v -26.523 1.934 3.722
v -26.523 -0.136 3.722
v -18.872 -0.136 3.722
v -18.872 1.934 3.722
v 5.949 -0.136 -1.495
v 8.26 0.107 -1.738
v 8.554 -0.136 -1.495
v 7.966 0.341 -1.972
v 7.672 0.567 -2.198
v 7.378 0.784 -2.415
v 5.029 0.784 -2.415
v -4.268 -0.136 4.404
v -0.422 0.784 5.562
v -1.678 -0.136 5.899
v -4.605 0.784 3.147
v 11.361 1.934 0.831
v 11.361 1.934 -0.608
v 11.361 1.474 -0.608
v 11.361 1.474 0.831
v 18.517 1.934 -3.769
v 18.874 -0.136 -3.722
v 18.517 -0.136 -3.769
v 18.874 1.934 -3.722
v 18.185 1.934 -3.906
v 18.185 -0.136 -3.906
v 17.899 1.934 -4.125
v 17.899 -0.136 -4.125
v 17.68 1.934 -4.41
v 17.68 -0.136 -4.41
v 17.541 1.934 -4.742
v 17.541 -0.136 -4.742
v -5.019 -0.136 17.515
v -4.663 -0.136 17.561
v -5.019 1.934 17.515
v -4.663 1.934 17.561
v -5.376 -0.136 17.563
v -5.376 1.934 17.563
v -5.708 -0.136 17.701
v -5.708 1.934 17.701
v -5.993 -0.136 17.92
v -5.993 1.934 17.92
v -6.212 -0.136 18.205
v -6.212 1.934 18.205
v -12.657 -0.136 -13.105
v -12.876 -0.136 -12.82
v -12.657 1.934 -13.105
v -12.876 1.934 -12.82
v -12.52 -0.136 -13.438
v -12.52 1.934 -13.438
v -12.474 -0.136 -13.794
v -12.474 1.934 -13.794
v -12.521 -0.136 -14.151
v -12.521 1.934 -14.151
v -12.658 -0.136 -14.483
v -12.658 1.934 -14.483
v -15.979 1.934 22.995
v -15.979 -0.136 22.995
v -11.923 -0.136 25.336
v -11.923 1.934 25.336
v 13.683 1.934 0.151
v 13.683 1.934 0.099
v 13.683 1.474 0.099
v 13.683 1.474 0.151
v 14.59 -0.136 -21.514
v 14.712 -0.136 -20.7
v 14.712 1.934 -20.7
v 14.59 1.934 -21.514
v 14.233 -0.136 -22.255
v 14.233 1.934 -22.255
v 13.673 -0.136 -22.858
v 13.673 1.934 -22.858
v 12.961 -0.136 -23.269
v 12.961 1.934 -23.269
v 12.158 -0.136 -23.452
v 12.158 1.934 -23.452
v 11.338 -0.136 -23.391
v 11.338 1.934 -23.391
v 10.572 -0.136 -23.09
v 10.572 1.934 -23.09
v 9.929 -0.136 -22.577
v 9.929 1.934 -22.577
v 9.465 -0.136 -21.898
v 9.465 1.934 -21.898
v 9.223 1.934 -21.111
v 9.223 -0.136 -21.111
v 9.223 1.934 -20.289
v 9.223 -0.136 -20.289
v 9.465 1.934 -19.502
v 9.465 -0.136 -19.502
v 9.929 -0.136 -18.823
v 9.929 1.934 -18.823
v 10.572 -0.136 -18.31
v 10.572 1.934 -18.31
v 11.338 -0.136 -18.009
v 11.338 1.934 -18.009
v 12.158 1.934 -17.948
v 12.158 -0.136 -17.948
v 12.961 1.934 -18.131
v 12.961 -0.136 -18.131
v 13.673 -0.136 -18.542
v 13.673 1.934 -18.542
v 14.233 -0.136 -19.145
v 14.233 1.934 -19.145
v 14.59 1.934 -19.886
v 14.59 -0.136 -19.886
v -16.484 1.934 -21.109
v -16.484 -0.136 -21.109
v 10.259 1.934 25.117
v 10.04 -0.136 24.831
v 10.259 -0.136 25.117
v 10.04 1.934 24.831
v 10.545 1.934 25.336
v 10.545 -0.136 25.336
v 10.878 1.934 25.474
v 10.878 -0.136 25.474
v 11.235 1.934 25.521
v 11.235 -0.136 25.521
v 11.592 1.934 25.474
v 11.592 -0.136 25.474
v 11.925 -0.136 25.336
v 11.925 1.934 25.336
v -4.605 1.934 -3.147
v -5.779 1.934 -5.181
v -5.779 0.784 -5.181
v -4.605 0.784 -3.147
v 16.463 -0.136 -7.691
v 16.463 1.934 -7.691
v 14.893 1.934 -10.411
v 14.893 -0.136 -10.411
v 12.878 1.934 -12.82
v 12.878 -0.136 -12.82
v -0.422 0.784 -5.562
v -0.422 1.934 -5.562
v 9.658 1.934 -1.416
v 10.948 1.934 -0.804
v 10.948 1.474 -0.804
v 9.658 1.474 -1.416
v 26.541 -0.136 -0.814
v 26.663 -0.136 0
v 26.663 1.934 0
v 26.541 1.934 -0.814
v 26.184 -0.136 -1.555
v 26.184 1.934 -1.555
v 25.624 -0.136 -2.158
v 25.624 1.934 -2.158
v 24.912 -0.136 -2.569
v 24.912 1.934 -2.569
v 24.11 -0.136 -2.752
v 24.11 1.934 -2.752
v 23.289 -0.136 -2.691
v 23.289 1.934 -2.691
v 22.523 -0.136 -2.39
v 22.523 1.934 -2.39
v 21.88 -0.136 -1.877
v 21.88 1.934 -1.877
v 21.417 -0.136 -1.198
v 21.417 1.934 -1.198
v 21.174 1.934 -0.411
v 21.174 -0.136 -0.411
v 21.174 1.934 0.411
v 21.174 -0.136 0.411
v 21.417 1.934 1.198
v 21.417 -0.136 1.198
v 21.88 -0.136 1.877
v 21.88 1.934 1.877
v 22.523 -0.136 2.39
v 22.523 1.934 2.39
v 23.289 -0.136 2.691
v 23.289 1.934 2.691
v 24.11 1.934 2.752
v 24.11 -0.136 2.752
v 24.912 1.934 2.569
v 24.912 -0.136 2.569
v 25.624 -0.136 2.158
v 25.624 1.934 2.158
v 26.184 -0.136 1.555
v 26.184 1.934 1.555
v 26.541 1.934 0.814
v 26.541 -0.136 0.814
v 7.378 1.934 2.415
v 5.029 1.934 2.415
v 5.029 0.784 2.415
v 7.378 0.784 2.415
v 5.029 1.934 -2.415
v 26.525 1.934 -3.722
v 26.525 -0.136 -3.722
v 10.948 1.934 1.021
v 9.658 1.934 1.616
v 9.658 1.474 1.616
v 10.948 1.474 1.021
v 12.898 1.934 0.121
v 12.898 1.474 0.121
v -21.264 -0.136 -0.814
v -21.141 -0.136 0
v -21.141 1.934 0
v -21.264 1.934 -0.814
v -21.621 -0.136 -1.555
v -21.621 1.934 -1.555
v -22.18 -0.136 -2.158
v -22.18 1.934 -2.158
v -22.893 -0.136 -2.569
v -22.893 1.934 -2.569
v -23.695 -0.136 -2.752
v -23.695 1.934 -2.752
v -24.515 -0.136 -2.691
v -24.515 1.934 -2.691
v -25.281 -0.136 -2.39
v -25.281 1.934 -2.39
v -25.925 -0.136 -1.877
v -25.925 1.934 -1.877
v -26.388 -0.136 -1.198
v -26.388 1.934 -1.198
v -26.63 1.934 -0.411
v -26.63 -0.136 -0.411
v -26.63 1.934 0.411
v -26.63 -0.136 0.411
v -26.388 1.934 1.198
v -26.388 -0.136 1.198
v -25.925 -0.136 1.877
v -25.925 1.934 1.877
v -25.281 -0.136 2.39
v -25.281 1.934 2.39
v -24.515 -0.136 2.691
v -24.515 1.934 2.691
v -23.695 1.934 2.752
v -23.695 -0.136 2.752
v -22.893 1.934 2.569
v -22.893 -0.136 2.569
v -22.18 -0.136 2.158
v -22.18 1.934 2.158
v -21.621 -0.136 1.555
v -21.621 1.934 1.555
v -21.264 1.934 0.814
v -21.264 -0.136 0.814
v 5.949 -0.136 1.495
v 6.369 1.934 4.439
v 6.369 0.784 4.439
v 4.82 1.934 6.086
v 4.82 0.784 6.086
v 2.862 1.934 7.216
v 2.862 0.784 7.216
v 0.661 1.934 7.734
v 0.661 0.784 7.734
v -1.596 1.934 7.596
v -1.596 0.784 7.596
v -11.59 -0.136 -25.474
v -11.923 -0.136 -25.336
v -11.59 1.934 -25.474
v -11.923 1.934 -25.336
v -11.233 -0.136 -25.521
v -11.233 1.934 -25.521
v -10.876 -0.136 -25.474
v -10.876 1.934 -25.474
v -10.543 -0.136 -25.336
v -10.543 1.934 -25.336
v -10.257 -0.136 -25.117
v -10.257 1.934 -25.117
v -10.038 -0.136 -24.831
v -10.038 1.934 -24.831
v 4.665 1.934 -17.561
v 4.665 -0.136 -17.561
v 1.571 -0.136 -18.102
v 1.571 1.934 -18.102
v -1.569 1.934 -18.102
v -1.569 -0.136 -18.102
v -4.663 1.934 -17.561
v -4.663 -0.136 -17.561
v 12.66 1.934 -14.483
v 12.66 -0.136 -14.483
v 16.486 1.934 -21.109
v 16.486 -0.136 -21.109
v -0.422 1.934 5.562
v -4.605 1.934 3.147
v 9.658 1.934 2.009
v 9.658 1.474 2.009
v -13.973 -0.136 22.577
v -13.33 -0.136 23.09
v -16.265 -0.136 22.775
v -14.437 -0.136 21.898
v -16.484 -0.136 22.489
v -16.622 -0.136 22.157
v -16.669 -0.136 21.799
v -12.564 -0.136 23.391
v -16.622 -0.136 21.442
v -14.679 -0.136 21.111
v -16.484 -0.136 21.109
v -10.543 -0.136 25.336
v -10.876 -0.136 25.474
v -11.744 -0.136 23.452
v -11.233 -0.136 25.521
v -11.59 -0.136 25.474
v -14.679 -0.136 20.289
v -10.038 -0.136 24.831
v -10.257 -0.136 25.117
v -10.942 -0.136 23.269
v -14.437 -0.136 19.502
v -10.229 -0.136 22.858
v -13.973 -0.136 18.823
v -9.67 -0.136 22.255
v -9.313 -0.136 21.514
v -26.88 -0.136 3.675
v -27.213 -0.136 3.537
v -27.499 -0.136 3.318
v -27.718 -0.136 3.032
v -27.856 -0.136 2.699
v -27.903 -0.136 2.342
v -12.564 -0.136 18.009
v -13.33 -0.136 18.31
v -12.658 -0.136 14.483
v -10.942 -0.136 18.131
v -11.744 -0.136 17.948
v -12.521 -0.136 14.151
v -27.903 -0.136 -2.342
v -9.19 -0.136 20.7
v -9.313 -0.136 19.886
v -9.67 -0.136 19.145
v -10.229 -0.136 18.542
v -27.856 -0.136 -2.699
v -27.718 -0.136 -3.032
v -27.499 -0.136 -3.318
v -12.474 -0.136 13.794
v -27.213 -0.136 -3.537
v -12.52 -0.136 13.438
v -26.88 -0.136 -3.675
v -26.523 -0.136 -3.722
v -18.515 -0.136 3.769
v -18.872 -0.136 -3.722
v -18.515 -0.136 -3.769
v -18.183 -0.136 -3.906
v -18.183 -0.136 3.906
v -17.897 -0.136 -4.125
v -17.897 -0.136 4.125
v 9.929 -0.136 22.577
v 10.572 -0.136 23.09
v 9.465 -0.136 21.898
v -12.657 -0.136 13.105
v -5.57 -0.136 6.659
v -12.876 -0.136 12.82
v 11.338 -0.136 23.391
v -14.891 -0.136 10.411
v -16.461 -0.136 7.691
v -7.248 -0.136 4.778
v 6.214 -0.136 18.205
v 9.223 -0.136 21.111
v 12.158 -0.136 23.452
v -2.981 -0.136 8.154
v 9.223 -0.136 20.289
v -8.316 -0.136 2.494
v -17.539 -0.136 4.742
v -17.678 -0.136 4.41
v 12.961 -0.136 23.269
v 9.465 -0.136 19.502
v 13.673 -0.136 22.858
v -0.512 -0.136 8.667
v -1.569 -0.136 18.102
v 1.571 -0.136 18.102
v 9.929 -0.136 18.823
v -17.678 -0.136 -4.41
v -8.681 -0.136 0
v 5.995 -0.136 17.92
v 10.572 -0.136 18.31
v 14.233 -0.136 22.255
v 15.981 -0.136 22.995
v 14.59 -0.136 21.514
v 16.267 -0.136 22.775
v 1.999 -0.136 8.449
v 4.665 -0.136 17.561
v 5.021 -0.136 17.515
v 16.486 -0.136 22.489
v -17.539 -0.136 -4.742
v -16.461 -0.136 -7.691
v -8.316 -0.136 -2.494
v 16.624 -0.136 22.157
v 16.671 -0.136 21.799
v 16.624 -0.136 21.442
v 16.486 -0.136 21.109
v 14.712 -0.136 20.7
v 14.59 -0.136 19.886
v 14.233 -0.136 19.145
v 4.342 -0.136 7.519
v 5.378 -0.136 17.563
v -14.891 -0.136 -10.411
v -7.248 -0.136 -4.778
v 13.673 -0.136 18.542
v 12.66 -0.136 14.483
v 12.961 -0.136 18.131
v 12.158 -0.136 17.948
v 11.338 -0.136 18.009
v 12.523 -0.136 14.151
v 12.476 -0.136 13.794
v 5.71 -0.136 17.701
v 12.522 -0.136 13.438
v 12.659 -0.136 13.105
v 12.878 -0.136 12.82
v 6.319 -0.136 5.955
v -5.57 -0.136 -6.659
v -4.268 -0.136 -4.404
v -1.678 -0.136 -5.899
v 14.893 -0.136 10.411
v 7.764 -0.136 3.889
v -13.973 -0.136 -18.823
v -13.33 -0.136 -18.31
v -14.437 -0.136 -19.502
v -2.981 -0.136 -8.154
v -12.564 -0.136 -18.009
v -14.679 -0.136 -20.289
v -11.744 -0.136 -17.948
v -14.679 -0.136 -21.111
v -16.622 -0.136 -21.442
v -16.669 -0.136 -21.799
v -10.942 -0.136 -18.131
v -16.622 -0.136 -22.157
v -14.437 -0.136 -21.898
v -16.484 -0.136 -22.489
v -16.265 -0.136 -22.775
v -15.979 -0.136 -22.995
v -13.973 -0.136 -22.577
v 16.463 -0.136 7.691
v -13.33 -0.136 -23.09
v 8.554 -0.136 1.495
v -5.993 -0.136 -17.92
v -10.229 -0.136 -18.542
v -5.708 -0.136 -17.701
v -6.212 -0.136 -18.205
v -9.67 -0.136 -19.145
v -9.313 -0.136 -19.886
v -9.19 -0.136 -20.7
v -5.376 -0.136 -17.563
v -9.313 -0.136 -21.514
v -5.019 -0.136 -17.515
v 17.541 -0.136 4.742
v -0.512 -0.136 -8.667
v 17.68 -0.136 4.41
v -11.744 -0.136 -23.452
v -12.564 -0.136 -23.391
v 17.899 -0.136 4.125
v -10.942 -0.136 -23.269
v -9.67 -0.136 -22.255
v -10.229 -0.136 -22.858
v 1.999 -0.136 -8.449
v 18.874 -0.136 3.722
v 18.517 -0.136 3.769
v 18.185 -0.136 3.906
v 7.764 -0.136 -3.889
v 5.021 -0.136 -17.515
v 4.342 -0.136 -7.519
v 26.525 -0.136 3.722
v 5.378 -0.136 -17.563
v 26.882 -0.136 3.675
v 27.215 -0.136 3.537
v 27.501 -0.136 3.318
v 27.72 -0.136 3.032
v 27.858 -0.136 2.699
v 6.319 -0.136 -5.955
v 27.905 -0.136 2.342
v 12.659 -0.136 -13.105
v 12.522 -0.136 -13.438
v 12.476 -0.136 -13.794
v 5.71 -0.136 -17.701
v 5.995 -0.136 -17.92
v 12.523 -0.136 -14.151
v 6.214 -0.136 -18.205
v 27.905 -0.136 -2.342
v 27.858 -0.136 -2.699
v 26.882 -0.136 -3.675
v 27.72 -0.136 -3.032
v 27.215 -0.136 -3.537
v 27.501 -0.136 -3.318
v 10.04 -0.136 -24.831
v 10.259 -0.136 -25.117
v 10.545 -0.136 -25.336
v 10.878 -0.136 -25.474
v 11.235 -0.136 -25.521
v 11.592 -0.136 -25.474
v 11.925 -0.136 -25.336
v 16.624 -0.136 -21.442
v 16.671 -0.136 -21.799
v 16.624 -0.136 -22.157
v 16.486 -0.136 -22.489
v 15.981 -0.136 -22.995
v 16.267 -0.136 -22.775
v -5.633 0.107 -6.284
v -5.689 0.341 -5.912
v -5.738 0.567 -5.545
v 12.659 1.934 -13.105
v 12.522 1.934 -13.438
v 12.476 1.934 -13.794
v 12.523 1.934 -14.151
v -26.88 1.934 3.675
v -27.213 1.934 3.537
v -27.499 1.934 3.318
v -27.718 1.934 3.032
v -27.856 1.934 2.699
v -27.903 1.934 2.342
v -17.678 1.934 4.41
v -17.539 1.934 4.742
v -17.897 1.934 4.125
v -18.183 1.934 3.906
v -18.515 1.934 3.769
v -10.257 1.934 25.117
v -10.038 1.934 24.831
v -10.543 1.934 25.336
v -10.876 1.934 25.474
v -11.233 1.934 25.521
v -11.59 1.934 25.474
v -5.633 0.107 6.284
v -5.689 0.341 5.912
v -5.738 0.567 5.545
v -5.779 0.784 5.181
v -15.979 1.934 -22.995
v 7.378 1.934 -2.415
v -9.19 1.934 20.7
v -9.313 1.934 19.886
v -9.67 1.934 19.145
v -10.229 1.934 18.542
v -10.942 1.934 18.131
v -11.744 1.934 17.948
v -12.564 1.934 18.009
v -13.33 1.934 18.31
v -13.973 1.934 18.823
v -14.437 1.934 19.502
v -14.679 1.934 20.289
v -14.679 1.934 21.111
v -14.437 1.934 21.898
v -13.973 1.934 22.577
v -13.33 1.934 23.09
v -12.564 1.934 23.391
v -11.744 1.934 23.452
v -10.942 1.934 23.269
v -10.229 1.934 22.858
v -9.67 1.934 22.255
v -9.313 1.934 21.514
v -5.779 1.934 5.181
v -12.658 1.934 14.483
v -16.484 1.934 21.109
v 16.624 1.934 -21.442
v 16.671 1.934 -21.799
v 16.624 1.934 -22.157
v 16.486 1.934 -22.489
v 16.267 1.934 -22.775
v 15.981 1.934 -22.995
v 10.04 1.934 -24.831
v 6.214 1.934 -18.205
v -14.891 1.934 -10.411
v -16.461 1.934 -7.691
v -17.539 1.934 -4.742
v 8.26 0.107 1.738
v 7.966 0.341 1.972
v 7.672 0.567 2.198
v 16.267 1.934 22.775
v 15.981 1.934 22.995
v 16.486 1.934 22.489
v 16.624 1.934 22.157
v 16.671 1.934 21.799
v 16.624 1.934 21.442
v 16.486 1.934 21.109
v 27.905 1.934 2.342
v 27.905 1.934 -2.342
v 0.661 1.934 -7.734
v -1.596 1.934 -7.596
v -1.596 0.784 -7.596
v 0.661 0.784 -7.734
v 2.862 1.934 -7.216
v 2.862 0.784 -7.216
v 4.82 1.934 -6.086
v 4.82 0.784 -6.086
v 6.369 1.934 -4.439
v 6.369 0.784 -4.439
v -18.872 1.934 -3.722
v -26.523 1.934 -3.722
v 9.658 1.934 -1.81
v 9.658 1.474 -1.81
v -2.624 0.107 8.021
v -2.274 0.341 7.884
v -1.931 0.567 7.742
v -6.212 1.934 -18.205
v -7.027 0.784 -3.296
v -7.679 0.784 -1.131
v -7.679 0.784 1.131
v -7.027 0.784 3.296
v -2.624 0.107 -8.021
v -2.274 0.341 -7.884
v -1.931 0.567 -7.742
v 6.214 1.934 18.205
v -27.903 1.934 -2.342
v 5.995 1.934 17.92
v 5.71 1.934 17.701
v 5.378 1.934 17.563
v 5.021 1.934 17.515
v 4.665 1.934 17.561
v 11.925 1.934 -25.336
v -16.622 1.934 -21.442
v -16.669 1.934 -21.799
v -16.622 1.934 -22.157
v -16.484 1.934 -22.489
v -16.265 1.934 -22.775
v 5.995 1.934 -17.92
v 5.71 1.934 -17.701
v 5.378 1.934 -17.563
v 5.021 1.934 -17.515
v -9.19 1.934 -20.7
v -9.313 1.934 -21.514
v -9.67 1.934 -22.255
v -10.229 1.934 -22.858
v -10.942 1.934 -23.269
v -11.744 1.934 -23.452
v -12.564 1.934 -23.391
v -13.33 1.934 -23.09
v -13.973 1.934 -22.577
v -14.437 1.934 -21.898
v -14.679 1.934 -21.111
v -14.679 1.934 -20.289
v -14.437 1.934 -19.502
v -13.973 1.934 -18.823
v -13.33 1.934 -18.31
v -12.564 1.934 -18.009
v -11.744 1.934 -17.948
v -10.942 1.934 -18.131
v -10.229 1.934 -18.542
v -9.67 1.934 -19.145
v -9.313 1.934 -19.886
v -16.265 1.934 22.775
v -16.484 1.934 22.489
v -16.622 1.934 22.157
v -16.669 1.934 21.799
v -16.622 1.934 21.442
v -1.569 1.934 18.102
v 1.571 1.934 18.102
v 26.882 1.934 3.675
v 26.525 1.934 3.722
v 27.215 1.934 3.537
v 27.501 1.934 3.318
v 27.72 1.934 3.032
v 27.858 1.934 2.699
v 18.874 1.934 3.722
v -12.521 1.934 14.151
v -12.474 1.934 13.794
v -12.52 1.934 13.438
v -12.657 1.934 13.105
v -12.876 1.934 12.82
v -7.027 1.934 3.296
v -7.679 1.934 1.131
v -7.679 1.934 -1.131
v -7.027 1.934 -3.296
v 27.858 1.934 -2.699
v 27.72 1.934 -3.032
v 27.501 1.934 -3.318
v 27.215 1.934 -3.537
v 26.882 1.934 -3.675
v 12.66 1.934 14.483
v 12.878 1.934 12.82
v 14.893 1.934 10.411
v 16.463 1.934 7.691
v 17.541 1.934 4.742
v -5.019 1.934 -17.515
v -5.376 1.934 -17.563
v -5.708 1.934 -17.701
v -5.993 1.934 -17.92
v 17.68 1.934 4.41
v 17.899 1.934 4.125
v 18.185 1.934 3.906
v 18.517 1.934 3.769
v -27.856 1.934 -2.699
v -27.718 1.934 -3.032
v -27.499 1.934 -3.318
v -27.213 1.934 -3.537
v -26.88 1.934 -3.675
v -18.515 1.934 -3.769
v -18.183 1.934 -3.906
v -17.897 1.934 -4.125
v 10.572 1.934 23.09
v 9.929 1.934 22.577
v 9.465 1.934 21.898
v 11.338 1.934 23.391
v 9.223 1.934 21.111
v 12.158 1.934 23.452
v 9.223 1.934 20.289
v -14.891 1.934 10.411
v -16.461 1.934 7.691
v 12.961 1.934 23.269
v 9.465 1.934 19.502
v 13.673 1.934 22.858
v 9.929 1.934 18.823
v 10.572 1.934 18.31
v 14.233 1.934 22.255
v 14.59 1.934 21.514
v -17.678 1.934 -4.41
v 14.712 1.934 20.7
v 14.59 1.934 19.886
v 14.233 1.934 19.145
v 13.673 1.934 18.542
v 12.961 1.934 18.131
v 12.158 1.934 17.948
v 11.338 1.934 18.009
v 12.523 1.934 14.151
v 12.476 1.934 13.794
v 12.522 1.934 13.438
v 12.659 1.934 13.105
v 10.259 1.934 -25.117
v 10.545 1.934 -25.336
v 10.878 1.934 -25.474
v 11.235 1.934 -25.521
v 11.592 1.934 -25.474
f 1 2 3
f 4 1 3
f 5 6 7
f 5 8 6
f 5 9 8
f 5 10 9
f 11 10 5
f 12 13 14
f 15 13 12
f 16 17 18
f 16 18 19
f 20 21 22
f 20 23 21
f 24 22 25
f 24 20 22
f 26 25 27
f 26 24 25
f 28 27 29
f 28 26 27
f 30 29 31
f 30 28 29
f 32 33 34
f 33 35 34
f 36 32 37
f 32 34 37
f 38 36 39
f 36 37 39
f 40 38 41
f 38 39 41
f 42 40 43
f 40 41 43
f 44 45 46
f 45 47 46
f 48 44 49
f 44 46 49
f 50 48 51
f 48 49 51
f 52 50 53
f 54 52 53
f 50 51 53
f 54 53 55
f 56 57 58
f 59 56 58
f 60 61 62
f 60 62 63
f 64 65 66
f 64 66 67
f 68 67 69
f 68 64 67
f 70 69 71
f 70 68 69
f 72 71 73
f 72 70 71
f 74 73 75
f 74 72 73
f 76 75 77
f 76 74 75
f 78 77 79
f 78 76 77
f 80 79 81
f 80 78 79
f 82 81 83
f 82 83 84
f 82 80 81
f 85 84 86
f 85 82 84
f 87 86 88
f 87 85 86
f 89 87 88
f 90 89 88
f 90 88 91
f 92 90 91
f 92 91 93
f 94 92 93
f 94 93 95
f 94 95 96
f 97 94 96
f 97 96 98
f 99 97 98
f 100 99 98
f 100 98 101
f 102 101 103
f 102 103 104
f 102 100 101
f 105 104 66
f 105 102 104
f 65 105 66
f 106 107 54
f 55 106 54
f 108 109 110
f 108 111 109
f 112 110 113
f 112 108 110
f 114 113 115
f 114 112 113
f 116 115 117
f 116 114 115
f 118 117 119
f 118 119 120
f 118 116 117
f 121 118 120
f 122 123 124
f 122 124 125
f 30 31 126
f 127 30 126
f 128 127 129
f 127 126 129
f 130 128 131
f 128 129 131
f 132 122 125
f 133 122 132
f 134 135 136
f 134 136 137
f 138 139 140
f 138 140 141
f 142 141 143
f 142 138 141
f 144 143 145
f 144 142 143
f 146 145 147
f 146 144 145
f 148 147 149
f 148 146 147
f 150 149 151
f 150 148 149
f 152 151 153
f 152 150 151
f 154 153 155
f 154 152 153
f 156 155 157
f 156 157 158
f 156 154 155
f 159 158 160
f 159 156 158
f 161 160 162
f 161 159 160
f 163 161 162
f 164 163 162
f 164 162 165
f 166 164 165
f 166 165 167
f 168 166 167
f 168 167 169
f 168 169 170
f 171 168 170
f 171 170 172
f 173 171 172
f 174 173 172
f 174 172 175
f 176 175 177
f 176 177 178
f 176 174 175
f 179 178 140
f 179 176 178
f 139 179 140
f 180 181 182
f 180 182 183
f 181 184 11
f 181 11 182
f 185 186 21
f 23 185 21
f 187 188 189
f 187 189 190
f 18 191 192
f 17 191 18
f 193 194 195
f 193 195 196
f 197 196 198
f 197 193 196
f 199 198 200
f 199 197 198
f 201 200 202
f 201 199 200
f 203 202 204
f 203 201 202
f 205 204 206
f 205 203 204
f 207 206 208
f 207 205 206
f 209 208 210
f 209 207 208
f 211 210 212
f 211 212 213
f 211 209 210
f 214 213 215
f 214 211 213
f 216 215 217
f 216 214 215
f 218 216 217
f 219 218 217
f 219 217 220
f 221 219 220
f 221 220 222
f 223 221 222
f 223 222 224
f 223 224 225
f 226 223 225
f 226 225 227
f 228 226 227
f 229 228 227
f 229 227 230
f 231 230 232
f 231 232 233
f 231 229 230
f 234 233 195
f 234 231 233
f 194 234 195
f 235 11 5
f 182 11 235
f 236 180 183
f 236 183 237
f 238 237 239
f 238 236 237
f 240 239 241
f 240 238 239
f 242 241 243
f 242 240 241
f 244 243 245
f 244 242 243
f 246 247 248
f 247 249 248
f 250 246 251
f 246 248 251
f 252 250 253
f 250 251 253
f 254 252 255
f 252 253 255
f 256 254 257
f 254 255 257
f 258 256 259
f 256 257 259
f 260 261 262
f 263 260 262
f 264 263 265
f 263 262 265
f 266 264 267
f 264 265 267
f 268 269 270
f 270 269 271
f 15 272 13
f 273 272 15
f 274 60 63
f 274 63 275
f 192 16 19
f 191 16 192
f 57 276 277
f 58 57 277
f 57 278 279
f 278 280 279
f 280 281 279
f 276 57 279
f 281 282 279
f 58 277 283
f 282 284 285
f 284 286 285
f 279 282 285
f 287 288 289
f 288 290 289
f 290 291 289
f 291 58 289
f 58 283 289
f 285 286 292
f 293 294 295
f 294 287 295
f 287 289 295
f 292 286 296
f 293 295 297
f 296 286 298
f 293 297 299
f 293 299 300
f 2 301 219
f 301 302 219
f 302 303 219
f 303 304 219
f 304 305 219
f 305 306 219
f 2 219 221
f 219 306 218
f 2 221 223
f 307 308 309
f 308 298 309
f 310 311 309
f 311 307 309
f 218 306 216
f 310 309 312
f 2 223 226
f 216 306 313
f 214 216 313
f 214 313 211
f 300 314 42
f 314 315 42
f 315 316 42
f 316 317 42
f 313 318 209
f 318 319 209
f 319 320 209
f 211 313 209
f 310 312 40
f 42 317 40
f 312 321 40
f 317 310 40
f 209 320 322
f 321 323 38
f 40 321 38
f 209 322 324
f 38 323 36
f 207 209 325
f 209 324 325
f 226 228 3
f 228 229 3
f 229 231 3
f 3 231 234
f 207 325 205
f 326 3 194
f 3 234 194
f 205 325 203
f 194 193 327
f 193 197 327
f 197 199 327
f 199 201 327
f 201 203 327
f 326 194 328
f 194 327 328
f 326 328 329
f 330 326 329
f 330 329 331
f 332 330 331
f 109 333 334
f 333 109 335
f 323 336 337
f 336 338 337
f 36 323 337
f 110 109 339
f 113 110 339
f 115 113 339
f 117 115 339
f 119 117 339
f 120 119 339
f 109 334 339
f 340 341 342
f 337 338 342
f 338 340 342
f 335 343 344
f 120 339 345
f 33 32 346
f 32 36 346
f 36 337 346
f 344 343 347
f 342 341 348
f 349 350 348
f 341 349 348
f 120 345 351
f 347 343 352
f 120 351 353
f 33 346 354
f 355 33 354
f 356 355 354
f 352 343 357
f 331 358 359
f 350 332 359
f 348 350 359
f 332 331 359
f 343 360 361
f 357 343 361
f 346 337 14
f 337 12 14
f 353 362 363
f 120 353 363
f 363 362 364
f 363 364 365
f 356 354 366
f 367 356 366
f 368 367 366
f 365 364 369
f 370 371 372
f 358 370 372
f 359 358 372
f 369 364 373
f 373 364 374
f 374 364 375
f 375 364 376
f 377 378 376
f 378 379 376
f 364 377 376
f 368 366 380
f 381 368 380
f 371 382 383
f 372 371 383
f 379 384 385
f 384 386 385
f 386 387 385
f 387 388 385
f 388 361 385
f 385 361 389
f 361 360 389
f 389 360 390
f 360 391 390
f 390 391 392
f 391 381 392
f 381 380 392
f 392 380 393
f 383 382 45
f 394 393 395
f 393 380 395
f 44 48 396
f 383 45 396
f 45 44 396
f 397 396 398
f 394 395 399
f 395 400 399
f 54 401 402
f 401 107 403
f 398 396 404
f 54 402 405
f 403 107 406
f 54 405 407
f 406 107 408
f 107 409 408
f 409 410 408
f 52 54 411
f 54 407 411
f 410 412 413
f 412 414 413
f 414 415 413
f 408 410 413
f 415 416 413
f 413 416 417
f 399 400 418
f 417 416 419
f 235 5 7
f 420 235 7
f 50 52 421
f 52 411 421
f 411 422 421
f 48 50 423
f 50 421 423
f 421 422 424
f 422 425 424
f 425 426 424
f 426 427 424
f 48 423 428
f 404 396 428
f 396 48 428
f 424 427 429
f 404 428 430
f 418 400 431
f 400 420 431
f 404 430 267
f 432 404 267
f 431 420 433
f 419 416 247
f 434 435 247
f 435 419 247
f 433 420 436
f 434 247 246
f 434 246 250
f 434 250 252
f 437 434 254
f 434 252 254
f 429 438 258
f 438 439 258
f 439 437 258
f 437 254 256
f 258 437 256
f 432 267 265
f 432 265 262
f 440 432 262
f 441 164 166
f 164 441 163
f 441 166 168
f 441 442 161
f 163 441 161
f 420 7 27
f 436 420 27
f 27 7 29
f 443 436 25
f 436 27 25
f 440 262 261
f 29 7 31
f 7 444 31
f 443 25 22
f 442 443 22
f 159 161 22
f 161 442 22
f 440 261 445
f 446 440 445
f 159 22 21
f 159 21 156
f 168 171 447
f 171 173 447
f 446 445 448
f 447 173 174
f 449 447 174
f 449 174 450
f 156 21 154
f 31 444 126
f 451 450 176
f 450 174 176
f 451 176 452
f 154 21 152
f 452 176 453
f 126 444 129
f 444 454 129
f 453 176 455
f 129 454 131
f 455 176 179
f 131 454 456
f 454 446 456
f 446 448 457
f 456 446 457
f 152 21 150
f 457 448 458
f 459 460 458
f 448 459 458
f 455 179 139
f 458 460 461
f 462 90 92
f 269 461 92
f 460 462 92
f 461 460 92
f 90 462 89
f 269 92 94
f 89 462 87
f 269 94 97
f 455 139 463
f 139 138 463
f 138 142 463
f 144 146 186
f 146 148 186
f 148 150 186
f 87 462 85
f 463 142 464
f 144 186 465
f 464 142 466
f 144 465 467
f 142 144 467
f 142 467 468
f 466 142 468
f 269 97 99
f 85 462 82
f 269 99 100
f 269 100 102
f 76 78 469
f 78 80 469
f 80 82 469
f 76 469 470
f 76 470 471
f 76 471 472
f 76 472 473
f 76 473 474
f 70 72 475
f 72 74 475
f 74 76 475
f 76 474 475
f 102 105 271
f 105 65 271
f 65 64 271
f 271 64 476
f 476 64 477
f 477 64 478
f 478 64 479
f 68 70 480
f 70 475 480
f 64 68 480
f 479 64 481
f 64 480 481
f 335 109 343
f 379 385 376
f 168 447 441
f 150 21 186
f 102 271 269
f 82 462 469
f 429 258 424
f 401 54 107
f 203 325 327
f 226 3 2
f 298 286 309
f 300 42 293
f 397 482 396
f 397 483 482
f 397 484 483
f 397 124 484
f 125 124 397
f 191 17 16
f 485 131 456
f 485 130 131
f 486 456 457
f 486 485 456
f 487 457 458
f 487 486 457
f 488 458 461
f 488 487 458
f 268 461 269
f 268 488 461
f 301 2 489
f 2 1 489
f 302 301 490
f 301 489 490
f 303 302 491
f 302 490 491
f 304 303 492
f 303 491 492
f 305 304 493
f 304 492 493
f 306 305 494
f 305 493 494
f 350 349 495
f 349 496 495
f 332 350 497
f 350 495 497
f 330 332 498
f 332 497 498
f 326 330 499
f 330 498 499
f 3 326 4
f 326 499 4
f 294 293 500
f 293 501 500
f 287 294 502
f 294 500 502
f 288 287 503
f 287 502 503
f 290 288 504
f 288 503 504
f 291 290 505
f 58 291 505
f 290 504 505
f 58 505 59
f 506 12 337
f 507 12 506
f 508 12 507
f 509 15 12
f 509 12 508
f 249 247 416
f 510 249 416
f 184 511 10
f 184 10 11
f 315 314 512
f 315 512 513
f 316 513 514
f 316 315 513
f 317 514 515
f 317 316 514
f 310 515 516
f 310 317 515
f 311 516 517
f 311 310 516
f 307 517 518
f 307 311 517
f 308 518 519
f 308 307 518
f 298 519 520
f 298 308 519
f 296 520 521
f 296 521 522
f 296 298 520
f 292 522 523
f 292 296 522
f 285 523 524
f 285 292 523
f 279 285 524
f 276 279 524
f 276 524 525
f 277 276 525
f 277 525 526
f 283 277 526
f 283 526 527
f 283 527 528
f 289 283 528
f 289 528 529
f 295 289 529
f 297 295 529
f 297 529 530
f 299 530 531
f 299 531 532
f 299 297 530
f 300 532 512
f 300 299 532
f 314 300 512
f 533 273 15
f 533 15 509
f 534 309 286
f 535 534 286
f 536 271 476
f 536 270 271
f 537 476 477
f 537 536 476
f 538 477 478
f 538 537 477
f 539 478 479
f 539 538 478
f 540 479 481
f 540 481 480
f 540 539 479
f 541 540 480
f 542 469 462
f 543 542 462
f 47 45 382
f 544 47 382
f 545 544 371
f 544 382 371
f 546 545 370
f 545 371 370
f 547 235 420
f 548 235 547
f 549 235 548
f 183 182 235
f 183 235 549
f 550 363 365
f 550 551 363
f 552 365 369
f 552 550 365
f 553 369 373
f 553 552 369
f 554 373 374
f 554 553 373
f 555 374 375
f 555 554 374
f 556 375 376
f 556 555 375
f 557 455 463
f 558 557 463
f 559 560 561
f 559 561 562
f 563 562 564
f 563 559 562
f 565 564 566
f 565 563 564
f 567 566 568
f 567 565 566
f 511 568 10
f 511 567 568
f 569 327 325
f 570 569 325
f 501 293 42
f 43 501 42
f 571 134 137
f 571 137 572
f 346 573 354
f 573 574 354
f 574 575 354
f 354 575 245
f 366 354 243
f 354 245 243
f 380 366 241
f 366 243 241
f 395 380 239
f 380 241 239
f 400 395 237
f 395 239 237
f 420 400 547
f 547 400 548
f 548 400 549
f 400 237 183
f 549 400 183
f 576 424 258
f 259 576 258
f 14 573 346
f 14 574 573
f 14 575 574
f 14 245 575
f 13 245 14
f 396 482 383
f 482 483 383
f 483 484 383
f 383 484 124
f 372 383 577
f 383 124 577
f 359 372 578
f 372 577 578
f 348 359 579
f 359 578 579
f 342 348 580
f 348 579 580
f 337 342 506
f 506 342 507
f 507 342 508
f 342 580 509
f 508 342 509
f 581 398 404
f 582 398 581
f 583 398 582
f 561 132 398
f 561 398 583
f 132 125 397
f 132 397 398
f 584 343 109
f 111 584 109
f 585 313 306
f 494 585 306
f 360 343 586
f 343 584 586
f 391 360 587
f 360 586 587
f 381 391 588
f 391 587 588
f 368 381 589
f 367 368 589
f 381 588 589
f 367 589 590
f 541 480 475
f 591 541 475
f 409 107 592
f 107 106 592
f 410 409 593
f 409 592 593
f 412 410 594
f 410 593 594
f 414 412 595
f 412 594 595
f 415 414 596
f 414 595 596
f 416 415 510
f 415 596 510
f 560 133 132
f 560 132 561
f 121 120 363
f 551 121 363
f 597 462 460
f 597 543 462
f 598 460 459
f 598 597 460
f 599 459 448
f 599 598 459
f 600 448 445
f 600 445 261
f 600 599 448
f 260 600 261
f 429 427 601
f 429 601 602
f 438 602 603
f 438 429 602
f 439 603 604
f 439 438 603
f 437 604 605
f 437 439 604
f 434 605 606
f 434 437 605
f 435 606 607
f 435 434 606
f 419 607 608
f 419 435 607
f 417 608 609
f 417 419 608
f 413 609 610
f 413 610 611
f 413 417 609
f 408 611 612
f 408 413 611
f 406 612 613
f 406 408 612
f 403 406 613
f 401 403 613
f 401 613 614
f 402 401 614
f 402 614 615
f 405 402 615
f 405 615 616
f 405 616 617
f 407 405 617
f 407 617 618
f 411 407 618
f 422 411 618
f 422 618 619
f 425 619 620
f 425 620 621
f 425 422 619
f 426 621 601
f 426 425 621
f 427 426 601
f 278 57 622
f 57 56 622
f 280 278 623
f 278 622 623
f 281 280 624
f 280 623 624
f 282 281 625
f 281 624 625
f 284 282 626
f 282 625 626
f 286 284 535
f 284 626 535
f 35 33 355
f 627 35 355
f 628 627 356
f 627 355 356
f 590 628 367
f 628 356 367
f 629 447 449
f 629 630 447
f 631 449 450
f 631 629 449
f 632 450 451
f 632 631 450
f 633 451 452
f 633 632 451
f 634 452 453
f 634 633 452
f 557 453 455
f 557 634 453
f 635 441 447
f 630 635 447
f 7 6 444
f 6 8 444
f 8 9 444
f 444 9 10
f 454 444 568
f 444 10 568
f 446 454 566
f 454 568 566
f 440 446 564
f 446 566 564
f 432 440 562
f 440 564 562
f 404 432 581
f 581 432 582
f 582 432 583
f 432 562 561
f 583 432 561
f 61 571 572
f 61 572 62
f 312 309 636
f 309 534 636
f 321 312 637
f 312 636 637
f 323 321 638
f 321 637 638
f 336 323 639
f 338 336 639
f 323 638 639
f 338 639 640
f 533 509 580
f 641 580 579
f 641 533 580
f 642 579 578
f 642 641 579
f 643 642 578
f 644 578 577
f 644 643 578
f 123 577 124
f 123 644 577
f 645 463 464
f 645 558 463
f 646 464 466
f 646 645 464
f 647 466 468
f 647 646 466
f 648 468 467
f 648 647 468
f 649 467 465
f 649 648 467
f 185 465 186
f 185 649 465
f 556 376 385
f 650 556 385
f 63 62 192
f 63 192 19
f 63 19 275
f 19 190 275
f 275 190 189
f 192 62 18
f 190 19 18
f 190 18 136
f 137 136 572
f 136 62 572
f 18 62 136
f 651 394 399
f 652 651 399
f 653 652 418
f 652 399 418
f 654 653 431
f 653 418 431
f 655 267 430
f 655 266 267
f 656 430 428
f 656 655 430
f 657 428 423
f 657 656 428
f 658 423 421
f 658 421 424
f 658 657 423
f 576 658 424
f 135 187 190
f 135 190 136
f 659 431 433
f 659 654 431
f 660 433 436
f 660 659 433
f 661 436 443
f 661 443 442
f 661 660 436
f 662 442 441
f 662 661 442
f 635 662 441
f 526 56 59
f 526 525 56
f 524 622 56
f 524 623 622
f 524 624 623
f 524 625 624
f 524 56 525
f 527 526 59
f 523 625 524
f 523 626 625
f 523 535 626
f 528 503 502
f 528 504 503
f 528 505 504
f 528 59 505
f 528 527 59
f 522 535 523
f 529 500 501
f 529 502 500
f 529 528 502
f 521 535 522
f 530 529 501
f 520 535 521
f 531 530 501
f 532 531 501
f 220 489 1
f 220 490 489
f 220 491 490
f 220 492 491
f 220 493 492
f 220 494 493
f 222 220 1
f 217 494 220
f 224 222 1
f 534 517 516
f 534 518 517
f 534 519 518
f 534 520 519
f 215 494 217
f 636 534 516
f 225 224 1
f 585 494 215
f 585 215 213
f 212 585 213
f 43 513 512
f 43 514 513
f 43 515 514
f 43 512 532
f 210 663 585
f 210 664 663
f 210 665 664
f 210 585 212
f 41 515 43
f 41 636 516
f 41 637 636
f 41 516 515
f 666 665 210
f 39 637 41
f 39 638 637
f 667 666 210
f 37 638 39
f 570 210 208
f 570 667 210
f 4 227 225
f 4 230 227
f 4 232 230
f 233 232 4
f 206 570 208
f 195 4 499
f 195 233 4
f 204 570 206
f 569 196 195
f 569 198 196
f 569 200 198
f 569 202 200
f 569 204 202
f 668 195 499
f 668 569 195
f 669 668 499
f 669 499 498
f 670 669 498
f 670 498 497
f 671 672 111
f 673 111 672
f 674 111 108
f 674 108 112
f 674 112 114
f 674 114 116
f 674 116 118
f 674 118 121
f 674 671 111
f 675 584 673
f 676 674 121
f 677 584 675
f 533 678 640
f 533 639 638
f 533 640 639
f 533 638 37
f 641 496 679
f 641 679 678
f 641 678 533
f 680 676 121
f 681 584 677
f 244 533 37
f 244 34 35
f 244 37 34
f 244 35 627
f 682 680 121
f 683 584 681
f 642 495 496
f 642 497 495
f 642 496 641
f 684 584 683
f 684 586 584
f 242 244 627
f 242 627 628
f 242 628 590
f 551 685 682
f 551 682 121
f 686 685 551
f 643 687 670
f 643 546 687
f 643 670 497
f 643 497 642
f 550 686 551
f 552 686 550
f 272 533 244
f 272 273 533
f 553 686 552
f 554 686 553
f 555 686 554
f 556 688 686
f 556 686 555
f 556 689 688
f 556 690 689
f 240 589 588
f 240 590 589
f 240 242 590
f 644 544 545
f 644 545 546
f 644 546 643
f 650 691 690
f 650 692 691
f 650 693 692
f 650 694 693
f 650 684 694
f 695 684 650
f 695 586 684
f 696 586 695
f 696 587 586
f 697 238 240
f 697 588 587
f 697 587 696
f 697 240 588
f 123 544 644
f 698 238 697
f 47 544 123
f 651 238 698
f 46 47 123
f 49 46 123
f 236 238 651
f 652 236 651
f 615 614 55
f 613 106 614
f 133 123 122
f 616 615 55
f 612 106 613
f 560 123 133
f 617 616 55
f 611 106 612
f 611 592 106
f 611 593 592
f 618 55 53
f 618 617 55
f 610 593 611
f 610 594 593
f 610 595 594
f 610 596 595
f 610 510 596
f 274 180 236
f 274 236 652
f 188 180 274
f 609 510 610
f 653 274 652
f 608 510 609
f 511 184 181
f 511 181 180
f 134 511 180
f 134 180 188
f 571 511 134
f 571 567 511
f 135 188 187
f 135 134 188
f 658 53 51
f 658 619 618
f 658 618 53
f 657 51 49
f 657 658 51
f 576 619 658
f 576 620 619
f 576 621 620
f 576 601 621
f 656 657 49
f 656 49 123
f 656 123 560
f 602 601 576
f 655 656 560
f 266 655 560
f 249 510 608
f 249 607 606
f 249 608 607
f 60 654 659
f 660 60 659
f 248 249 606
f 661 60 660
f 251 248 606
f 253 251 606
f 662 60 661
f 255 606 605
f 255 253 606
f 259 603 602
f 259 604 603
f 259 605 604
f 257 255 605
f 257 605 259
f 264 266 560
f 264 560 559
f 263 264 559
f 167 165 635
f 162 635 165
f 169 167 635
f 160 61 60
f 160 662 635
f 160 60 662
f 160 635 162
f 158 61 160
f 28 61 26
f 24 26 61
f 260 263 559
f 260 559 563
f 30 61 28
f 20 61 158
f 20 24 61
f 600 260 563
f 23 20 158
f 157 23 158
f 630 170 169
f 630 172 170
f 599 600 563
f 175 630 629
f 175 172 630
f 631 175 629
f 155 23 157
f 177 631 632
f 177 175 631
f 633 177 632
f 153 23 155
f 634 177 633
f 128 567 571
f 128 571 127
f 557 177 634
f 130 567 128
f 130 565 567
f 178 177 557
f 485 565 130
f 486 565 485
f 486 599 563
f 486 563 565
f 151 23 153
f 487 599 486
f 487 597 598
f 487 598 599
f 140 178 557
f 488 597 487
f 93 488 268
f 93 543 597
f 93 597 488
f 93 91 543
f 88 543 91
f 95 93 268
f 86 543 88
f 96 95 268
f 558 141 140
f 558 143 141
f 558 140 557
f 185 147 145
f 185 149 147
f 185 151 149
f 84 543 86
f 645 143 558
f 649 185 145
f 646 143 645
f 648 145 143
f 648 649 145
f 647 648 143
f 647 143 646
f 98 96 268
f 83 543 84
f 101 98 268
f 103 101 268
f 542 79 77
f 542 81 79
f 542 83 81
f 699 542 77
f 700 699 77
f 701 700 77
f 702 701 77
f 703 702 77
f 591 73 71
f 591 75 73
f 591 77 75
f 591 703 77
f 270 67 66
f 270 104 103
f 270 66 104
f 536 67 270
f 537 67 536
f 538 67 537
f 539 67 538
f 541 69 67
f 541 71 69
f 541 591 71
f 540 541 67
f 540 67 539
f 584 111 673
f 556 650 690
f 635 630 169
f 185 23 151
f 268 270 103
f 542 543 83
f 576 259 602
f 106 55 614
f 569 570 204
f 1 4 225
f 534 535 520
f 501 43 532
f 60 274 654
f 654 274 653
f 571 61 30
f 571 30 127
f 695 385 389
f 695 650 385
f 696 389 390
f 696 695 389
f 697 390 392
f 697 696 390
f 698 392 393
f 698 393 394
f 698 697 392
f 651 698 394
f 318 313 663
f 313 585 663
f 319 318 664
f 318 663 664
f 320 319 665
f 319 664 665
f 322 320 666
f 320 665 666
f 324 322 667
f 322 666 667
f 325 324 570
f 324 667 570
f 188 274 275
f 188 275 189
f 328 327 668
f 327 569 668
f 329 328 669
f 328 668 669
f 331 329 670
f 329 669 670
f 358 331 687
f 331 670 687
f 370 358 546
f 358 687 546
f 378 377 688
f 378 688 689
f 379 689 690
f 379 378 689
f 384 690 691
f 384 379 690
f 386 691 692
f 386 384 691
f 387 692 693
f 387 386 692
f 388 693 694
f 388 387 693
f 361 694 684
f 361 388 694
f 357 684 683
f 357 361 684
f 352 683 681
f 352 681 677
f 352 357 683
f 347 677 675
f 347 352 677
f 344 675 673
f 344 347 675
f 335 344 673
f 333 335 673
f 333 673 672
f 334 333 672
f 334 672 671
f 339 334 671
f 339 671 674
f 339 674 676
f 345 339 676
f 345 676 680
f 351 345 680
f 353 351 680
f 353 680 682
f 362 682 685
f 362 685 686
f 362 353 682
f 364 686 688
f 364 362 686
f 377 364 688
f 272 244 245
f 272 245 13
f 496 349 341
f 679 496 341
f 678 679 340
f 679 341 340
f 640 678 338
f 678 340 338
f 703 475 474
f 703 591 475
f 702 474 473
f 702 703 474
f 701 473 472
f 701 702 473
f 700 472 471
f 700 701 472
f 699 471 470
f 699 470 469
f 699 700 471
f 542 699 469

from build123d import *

# Parameters (mm, degrees)
SKETCH1_R           = 2.4
BOSS_EXTRUDE1_DEPTH = 1.8
FILLET11_R          = 1.2
CUT_EXTRUDE3_DEPTH  = 0.4
CUT_EXTRUDE4_DEPTH  = 2.5
CHAMFER1_SIZE       = 0.8
SCALE1_SCALE        = 1.15


with BuildPart() as part:
    # Sketch1 → Boss-Extrude1 (new body)
    with BuildSketch(Plane(origin=(0, 0, 0), x_dir=(1, 0, 0), z_dir=(0, 1, 0))):
        with BuildLine():
            Line((4.929751496, -15.011247456), (9.329383596, -22.631633787))
            Line((9.329383596, -22.631633787), (14.934877991, -19.395300089))
            Line((14.934877991, -19.395300089), (10.535245891, -11.774913758))
            ThreePointArc((10.535245891, -11.774913758), (13.68320138, -7.9), (15.464997388, -3.236333698))
            Line((15.464997388, -3.236333698), (24.264261587, -3.236333698))
            Line((24.264261587, -3.236333698), (24.264261587, 3.236333698))
            Line((24.264261587, 3.236333698), (15.464997388, 3.236333698))
            ThreePointArc((15.464997388, 3.236333698), (13.68320138, 7.9), (10.535245891, 11.774913758))
            Line((10.535245891, 11.774913758), (14.934877991, 19.395300089))
            Line((14.934877991, 19.395300089), (9.329383596, 22.631633787))
            Line((9.329383596, 22.631633787), (4.929751496, 15.011247456))
            ThreePointArc((4.929751496, 15.011247456), (0, 15.8), (-4.929751496, 15.011247456))
            Line((-4.929751496, 15.011247456), (-9.329383596, 22.631633787))
            Line((-9.329383596, 22.631633787), (-14.934877991, 19.395300089))
            Line((-14.934877991, 19.395300089), (-10.535245891, 11.774913758))
            ThreePointArc((-10.535245891, 11.774913758), (-13.68320138, 7.9), (-15.464997388, 3.236333698))
            Line((-15.464997388, 3.236333698), (-24.264261587, 3.236333698))
            Line((-24.264261587, 3.236333698), (-24.264261587, -3.236333698))
            Line((-24.264261587, -3.236333698), (-15.464997388, -3.236333698))
            ThreePointArc((-15.464997388, -3.236333698), (-13.68320138, -7.9), (-10.535245891, -11.774913758))
            Line((-10.535245891, -11.774913758), (-14.934877991, -19.395300089))
            Line((-14.934877991, -19.395300089), (-9.329383596, -22.631633787))
            Line((-9.329383596, -22.631633787), (-4.929751496, -15.011247456))
            ThreePointArc((-4.929751496, -15.011247456), (0, -15.8), (4.929751496, -15.011247456))
        make_face()
        with Locations((20.784609691, 0)):
            Circle(SKETCH1_R, mode=Mode.SUBTRACT)
        with Locations((10.392304845, -18)):
            Circle(SKETCH1_R, mode=Mode.SUBTRACT)
        with Locations((-10.392304845, -18)):
            Circle(SKETCH1_R, mode=Mode.SUBTRACT)
        with Locations((-20.784609691, 0)):
            Circle(SKETCH1_R, mode=Mode.SUBTRACT)
        with Locations((-10.392304845, 18)):
            Circle(SKETCH1_R, mode=Mode.SUBTRACT)
        with Locations((10.392304845, 18)):
            Circle(SKETCH1_R, mode=Mode.SUBTRACT)
    extrude(amount=BOSS_EXTRUDE1_DEPTH)

    # Fillet11
    fillet11_edges = [part.edges().sort_by_distance(p)[0] for p in [
        (24.264261587, 0.9, 3.236333698),
        (15.464997388, 0.9, 3.236333698),
        (10.535245891, 0.9, 11.774913758),
        (14.934877991, 0.9, 19.395300089),
        (9.329383596, 0.9, 22.631633787),
        (4.929751496, 0.9, 15.011247456),
        (-4.929751496, 0.9, 15.011247456),
        (-9.329383596, 0.9, 22.631633787),
        (-14.934877991, 0.9, 19.395300089),
        (-10.535245891, 0.9, 11.774913758),
        (-15.464997388, 0.9, 3.236333698),
        (-24.264261587, 0.9, 3.236333698),
        (-24.264261587, 0.9, -3.236333698),
        (-15.464997388, 0.9, -3.236333698),
        (-10.535245891, 0.9, -11.774913758),
        (-14.934877991, 0.9, -19.395300089),
        (-9.329383596, 0.9, -22.631633787),
        (-4.929751496, 0.9, -15.011247456),
        (4.929751496, 0.9, -15.011247456),
        (9.329383596, 0.9, -22.631633787),
        (14.934877991, 0.9, -19.395300089),
        (10.535245891, 0.9, -11.774913758),
        (15.464997388, 0.9, -3.236333698),
        (24.264261587, 0.9, -3.236333698),
    ]]
    fillet(fillet11_edges, radius=FILLET11_R)

    # Sketch10 → Cut-Extrude3 (cut)
    with BuildSketch(Plane(origin=(0, 1.8, 0), x_dir=(1, 0, 0), z_dir=(0, 1, 0))):
        Polygon((11.897175645, -0.131244585), (8.397175645, -1.7466292), (8.397175645, -1.405182886), (9.518970517, -0.887755001), (9.518970517, 0.698883621), (8.397175645, 1.231035063), (8.397175645, 1.573883621), (11.897175645, -0.08637279), align=None)
        Polygon((11.214984138, -0.105303078), (9.877944876, 0.528511024), (9.877944876, -0.722290258), align=None, mode=Mode.SUBTRACT)
    extrude(amount=-CUT_EXTRUDE3_DEPTH, mode=Mode.SUBTRACT)

    # Sketch11 → Cut-Extrude4 (cut, symmetric)
    with BuildSketch(Plane(origin=(0, 0, 0), x_dir=(1, 0, 0), z_dir=(0, 1, 0))):
        with BuildLine():
            Line((-0.367543966, -4.836604823), (-4.004850662, -2.736604823))
            Line((-4.004850662, -2.736604823), (-5.026164065, -4.505571528))
            ThreePointArc((-5.026164065, -4.505571528), (-6.75, 0), (-5.026164065, 4.505571528))
            Line((-5.026164065, 4.505571528), (-4.004850662, 2.736604823))
            Line((-4.004850662, 2.736604823), (-0.367543966, 4.836604823))
            Line((-0.367543966, 4.836604823), (-1.388857369, 6.605571528))
            ThreePointArc((-1.388857369, 6.605571528), (3.375, 5.845671476), (6.415021434, 2.1))
            Line((6.415021434, 2.1), (4.372394628, 2.1))
            Line((4.372394628, 2.1), (4.372394628, -2.1))
            Line((4.372394628, -2.1), (6.415021434, -2.1))
            ThreePointArc((6.415021434, -2.1), (3.375, -5.845671476), (-1.388857369, -6.605571528))
            Line((-1.388857369, -6.605571528), (-0.367543966, -4.836604823))
        make_face()
    extrude(amount=CUT_EXTRUDE4_DEPTH, both=True, mode=Mode.SUBTRACT)

    # Chamfer1
    chamfer1_edges = [part.edges().sort_by_distance(p)[0] for p in [
        (5.393708031, 0, -2.1),
        (4.372394628, 0, 0),
        (5.393708031, 0, 2.1),
        (3.375, 0, 5.845671476),
        (-0.878200668, 0, 5.721088175),
        (-2.186197314, 0, 3.786604823),
        (-4.515507363, 0, 3.621088175),
        (-6.75, 0, 0),
        (-4.515507363, 0, -3.621088175),
        (-2.186197314, 0, -3.786604823),
        (-0.878200668, 0, -5.721088175),
        (3.375, 0, -5.845671476),
    ]]
    chamfer(chamfer1_edges, length=CHAMFER1_SIZE)


with BuildPart() as part_1:
    # Scale1: scaled about (-0.006722783, 0.906799408, -6.4443e-05)
    add(part.part.scale(SCALE1_SCALE).moved(Location((0.001008417, -0.136019911, 9.666e-06))))


solid = part_1.part
